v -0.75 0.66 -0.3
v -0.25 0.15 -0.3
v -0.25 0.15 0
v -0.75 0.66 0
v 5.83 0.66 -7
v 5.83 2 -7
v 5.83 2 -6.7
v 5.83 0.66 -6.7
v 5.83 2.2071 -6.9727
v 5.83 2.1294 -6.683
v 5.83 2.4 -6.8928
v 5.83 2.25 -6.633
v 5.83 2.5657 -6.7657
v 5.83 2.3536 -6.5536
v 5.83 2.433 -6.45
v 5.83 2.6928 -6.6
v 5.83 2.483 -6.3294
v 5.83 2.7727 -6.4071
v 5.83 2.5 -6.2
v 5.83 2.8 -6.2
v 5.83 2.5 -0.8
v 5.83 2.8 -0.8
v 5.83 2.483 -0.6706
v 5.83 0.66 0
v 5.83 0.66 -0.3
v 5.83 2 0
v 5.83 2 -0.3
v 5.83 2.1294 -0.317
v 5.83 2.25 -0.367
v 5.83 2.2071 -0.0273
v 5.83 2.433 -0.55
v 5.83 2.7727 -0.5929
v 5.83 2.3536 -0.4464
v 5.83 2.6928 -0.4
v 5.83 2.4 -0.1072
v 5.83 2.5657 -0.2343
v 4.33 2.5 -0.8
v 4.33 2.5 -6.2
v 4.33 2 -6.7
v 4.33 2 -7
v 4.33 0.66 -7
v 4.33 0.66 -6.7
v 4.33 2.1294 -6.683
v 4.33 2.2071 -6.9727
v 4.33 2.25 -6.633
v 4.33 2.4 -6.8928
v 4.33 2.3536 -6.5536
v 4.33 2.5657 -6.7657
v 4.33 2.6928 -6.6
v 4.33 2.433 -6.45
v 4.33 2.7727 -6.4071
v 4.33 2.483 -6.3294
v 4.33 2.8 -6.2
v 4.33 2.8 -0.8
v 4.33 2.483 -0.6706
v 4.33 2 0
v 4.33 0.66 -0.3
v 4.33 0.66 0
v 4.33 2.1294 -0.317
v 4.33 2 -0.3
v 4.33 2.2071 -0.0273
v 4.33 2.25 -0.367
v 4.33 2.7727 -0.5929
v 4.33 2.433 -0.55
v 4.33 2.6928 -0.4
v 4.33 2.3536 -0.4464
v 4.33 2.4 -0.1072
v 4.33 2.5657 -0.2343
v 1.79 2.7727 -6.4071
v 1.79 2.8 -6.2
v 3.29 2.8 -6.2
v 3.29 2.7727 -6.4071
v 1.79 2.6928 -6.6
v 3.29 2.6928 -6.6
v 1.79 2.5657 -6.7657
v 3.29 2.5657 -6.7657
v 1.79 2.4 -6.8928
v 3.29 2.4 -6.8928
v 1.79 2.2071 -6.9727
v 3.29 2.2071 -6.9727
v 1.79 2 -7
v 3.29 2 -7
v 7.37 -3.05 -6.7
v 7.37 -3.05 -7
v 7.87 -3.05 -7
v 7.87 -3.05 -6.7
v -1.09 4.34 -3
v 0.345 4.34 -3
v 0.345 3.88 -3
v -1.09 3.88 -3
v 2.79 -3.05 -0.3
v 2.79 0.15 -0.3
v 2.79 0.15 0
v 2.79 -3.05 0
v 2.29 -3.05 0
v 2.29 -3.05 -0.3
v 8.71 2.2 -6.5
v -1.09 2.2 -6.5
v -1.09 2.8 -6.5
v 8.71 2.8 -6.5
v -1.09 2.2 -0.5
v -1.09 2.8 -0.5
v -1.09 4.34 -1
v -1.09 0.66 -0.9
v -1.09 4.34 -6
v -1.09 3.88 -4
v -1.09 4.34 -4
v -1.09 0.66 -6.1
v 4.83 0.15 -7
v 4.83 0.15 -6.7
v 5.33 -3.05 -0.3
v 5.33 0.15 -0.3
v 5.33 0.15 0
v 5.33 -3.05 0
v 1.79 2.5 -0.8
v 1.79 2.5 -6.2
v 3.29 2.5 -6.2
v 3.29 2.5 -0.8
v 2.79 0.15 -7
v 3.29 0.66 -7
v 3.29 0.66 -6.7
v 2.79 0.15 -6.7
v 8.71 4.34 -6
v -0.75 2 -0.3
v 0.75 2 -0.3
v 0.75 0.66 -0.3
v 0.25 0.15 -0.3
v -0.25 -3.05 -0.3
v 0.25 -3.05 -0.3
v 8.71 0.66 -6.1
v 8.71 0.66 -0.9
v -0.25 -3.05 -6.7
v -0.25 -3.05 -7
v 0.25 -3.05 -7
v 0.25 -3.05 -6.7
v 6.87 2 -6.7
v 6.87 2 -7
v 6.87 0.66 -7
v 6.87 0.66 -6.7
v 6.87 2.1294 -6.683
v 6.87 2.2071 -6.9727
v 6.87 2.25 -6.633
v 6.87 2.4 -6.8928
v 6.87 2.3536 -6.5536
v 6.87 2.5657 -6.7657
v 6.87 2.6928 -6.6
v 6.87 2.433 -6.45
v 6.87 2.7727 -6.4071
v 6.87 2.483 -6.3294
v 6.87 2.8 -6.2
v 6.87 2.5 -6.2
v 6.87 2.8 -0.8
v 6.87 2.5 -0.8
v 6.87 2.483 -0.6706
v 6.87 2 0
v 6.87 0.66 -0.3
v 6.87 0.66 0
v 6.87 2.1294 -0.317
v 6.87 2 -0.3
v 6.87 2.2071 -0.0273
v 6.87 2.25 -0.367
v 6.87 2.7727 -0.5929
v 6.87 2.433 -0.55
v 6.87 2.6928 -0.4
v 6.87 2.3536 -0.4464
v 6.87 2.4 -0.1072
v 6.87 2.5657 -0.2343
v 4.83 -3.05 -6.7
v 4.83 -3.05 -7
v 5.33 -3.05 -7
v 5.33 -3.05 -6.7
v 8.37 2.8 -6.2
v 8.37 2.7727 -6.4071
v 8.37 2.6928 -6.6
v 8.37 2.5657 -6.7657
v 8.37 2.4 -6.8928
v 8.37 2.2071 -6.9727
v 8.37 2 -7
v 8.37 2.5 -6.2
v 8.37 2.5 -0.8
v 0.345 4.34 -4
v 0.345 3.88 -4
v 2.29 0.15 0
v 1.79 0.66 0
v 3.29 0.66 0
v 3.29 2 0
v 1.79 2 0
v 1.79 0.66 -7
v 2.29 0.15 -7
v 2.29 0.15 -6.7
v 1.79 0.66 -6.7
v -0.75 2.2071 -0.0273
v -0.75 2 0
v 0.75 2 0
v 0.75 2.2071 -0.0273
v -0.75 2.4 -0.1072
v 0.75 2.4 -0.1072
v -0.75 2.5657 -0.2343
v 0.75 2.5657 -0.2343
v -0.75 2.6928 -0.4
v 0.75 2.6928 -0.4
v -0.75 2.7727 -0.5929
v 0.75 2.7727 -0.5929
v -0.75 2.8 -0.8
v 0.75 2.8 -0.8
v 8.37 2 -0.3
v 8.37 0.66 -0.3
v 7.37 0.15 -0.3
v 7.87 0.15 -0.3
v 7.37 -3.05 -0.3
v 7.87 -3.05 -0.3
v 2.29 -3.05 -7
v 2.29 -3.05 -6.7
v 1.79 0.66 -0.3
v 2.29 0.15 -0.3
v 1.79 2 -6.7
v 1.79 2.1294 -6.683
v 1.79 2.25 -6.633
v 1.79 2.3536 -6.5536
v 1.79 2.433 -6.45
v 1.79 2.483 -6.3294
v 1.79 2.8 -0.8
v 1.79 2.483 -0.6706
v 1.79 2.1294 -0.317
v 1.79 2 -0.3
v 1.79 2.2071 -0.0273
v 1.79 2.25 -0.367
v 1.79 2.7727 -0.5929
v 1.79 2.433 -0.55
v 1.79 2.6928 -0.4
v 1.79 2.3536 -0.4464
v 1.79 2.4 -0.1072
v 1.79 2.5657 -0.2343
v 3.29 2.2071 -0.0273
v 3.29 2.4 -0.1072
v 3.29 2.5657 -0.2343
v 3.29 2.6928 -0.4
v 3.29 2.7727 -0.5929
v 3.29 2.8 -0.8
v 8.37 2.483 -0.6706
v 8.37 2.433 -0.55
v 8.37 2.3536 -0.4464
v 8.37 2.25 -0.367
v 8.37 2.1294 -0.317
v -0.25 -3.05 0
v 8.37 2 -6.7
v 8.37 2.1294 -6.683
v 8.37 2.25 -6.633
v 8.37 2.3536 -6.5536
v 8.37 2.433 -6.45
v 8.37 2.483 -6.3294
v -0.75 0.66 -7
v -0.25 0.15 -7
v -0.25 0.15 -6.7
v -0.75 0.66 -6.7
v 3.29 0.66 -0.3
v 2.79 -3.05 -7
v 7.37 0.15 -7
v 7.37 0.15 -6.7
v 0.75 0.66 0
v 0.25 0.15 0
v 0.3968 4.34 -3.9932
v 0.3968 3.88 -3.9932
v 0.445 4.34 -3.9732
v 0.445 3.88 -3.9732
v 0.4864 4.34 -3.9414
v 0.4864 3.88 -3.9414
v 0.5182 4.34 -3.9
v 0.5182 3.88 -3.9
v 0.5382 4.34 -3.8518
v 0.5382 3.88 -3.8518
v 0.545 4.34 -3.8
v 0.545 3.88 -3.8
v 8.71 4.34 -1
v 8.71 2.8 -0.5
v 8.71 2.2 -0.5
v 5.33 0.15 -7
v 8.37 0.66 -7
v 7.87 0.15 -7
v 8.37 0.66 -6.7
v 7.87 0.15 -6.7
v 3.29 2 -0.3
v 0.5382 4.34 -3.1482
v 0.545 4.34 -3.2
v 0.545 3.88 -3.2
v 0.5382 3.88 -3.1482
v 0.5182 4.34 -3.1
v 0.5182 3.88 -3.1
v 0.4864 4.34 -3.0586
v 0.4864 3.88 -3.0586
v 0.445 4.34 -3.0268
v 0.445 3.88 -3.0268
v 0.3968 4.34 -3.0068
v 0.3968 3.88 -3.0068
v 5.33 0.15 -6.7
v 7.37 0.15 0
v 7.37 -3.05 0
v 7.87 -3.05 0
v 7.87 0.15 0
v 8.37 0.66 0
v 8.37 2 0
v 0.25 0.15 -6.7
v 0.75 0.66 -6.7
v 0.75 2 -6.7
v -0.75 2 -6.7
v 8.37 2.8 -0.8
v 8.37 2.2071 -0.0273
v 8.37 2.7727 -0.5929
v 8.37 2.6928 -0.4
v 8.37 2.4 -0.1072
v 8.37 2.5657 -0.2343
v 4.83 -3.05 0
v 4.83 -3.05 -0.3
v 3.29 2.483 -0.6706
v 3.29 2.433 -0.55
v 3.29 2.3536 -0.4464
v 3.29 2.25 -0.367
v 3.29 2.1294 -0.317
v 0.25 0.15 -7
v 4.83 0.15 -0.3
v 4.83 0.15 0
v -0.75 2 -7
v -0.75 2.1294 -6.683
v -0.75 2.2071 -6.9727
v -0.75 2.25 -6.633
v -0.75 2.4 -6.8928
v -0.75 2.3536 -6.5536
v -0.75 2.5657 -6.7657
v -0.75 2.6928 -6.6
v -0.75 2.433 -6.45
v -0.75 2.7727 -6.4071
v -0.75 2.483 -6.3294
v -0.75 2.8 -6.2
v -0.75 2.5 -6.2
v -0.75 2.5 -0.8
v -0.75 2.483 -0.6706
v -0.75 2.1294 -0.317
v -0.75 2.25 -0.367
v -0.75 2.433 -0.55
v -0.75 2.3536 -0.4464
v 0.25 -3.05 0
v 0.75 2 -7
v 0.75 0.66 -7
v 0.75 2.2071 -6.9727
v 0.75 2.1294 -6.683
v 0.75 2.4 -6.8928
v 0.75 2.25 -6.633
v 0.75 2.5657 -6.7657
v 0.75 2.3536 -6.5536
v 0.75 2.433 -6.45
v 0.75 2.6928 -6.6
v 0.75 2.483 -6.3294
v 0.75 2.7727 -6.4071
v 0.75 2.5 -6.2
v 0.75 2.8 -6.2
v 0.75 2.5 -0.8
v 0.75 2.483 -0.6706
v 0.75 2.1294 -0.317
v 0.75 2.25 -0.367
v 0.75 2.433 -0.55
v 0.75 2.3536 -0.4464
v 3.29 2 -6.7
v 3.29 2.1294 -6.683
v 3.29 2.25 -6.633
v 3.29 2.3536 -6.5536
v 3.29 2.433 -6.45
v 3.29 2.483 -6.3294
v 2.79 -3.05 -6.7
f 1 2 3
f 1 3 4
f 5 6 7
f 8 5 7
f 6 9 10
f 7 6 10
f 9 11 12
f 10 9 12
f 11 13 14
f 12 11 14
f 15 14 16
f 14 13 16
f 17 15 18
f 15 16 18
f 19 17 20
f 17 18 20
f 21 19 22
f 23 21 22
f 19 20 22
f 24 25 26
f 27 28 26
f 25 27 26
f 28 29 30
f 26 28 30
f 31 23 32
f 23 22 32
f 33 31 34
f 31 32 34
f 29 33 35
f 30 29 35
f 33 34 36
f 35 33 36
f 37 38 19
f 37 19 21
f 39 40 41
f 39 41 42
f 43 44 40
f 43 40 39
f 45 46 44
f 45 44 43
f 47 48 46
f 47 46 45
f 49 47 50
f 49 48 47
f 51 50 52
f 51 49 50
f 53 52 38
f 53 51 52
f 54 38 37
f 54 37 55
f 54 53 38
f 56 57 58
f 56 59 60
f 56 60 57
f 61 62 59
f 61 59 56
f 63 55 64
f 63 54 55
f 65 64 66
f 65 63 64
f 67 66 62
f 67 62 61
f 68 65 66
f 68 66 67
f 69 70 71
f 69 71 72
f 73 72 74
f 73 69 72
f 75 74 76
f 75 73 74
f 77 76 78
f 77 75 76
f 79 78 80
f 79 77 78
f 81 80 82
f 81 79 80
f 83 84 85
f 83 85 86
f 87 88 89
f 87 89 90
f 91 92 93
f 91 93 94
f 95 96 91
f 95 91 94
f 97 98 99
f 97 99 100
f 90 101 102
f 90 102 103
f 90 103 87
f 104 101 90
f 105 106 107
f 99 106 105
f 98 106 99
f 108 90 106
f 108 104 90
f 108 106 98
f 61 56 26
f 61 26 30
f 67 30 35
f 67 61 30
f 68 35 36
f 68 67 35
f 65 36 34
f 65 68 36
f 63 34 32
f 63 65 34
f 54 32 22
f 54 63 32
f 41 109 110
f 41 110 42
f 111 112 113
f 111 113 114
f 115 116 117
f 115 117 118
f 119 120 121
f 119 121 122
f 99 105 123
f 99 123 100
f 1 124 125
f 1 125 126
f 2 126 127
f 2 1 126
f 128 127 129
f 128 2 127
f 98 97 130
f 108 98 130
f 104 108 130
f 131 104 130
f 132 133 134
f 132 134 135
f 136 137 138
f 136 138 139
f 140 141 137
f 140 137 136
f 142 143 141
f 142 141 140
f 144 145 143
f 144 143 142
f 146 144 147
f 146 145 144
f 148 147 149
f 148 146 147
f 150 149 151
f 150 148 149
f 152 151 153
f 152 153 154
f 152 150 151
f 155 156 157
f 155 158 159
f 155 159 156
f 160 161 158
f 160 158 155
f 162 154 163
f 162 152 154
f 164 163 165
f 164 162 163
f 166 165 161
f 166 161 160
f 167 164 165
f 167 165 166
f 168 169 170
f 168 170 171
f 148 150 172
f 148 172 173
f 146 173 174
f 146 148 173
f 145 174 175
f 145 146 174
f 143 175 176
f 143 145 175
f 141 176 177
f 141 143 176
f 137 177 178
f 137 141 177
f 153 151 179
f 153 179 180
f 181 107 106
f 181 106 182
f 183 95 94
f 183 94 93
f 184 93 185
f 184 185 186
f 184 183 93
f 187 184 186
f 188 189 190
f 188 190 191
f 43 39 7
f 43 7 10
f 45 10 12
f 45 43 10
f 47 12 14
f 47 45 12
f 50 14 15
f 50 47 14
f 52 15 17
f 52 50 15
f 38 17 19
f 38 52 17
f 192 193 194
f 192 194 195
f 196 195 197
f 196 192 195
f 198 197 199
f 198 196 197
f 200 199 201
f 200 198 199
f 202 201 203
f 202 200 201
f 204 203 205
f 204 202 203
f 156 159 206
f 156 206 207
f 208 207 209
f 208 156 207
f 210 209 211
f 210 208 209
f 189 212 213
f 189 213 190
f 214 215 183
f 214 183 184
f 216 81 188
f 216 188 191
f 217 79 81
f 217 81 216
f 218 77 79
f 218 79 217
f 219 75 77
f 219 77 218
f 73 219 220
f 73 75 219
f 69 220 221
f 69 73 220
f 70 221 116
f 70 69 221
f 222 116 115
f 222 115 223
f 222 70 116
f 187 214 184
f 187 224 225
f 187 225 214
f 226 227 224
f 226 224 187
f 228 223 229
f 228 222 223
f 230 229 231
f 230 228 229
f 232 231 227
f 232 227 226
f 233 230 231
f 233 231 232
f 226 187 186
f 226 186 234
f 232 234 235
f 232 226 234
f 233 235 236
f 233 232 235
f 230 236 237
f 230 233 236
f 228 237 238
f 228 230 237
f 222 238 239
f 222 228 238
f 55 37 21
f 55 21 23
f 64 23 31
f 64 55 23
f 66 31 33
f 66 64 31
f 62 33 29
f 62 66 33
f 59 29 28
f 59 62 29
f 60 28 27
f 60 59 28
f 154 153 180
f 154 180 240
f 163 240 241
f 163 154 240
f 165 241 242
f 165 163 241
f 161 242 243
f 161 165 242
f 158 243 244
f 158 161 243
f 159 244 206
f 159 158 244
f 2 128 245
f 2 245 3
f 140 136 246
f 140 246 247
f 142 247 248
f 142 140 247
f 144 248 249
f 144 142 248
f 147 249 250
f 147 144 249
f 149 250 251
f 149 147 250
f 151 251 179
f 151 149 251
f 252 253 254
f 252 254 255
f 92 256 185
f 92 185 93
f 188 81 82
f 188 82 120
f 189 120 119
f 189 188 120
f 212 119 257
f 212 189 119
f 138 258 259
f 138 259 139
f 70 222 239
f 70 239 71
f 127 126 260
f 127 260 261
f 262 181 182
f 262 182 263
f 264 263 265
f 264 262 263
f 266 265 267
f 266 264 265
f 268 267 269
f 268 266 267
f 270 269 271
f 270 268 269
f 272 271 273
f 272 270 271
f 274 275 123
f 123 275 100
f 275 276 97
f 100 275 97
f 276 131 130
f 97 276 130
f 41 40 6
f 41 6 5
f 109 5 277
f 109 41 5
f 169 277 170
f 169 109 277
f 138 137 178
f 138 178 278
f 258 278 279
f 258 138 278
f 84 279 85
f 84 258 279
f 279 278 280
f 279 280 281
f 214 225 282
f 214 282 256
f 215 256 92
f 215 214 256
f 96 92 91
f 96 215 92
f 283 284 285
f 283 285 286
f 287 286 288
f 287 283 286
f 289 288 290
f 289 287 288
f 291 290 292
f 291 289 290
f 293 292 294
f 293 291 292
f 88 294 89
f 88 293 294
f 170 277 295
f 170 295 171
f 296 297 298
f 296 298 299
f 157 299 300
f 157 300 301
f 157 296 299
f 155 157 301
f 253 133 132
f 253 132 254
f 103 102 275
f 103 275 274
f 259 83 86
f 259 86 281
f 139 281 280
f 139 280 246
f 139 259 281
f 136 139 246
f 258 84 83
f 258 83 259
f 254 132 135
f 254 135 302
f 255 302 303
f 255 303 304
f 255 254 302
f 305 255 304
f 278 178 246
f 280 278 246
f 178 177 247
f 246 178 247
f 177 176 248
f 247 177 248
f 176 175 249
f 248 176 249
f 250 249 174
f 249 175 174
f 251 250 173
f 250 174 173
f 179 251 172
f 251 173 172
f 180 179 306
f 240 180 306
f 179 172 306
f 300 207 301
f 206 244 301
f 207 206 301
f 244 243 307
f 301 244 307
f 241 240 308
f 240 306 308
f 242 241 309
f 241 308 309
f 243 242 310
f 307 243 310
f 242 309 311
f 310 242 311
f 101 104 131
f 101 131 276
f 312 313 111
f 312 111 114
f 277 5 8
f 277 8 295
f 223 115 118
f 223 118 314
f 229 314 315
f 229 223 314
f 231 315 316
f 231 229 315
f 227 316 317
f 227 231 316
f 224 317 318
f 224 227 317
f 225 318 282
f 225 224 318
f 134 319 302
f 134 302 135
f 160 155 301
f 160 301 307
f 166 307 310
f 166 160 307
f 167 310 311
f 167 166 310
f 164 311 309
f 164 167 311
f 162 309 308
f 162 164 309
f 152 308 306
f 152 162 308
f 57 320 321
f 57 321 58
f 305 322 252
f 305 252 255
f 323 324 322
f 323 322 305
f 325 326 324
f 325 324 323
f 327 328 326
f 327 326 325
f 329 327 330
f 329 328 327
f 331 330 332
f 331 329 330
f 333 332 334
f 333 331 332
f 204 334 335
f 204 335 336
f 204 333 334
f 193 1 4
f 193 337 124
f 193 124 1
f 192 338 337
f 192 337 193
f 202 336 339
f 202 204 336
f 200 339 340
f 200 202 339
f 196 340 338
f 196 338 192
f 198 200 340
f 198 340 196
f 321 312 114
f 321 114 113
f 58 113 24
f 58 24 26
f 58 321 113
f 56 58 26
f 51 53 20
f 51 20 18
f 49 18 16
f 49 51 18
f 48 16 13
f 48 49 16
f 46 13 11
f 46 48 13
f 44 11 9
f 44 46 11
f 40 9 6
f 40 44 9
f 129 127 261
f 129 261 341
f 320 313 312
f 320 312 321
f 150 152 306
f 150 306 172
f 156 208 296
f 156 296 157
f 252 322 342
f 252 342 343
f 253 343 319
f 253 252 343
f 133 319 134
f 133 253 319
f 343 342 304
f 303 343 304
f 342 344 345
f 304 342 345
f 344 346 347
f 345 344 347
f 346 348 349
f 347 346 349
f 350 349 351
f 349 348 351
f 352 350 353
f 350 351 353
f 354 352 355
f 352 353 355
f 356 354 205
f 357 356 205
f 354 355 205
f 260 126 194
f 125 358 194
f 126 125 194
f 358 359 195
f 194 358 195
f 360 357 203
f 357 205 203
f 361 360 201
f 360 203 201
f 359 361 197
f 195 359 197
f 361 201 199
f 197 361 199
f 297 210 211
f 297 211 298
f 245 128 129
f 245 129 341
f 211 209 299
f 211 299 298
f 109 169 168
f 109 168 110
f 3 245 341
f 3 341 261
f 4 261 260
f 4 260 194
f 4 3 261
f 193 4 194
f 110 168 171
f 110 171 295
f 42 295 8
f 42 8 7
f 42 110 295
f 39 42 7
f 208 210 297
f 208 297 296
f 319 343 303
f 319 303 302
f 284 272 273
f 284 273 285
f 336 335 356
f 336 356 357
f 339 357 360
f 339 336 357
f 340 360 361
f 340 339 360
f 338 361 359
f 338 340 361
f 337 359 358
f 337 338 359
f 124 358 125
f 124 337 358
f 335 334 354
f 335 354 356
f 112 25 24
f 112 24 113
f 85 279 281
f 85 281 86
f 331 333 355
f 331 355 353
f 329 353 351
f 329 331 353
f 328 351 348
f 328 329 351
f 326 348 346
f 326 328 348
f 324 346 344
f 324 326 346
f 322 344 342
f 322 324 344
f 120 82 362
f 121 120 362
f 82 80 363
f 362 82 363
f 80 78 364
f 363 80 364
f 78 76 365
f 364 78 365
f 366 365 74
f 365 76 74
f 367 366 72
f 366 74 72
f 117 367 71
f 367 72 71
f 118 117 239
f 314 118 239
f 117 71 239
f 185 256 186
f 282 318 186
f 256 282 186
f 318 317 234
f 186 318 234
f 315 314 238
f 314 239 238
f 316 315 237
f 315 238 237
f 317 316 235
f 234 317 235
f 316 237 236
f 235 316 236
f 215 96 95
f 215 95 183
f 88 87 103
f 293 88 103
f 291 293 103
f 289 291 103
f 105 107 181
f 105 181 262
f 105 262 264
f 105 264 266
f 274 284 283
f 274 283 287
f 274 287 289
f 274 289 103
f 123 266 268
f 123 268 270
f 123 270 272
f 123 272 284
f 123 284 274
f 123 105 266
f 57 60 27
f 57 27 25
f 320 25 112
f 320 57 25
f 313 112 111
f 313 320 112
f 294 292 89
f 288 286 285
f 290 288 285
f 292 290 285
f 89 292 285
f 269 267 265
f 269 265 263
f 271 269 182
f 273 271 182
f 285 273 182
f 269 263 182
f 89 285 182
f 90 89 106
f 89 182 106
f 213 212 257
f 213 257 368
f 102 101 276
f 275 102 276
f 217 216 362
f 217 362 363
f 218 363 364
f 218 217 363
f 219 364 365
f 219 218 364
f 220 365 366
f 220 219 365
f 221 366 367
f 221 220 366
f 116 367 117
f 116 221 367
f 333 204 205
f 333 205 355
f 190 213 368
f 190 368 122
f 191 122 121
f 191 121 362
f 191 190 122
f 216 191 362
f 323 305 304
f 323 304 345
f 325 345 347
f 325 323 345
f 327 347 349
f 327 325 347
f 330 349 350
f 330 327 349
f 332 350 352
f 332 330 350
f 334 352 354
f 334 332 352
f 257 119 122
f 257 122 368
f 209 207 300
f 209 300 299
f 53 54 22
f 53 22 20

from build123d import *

# Parameters (mm, degrees)
BODY_FEATURE_DEPTH                    = 1.84
BODY_FEATURE_DEPTH_BACK               = 1.84
SKETCH1_W                             = 9.8
SKETCH1_H                             = 6
BEVEL_FEATURE_DEPTH                   = 9.8
BEVEL_FEATURE_DEPTH_BACK              = 9.8
SIGN_FEATURE_DEPTH                    = 0.46
FIRST_AND_LAST_PIN_FEATURE_DEPTH      = 0.75
FIRST_AND_LAST_PIN_FEATURE_DEPTH_BACK = 0.75
PIN_PROFILE_FEATURE_DEPTH             = 10
PIN_PROFILE_FEATURE_DEPTH_BACK        = 10
OTHER_PINS_FEATURE_COUNT              = 4
OTHER_PINS_FEATURE_PITCH              = 2.54


# Sheet-metal steps are written as plain solids
with BuildPart() as part:
    # Sketch1 → Body Feature (new, two sides: drawn at the far end of the back side and taken through both)
    with BuildSketch(Plane(origin=(0, 2.5, 0), x_dir=(1, 0, 0), z_dir=(0, 1, 0)).offset(-BODY_FEATURE_DEPTH_BACK)):
        with Locations((3.81, 3.5)):
            Rectangle(SKETCH1_W, SKETCH1_H)
    extrude(amount=BODY_FEATURE_DEPTH + BODY_FEATURE_DEPTH_BACK)

    # Sketch2 → Bevel Feature (cut, two sides: drawn at the far end of the back side and taken through both)
    with BuildSketch(Plane(origin=(0, 0, 0), x_dir=(0, 0, -1), z_dir=(1, 0, 0)).offset(-BEVEL_FEATURE_DEPTH_BACK)):
        Polygon((-9.5, 4.382711437), (-6.267114103, 14.34), (13.267114103, 14.34), (16.5, 4.382711437), (16.5, 0.922493794), (13.834417196, -9.34), (-6.834417196, -9.34), (-9.5, 0.922493794), align=None)
        Polygon((0.5, 2.8), (1, 4.34), (6, 4.34), (6.5, 2.8), (6.5, 2.2), (6.1, 0.66), (0.9, 0.66), (0.5, 2.2), align=None, mode=Mode.SUBTRACT)
    extrude(amount=BEVEL_FEATURE_DEPTH + BEVEL_FEATURE_DEPTH_BACK, mode=Mode.SUBTRACT)

    # Sketch3 → Sign Feature (cut)
    with BuildSketch(Plane(origin=(0, 4.34, 0), x_dir=(1, 0, 0), z_dir=(0, 1, 0))):
        with BuildLine():
            Line((-1.435, 4), (0.345, 4))
            ThreePointArc((0.345, 4), (0.486421356, 3.941421356), (0.545, 3.8))
            Line((0.545, 3.8), (0.545, 3.2))
            ThreePointArc((0.545, 3.2), (0.486421356, 3.058578644), (0.345, 3))
            Line((0.345, 3), (-1.435, 3))
            ThreePointArc((-1.435, 3), (-1.576421356, 3.058578644), (-1.635, 3.2))
            Line((-1.635, 3.2), (-1.635, 3.8))
            ThreePointArc((-1.635, 3.8), (-1.576421356, 3.941421356), (-1.435, 4))
        make_face()
    extrude(amount=-SIGN_FEATURE_DEPTH, mode=Mode.SUBTRACT)


with BuildPart() as body_2:
    # Sketch4 → First and Last Pin Feature (new, two sides: drawn at the far end of the back side and taken through both)
    with BuildSketch(Plane(origin=(0, 0, 0), x_dir=(0, 0, -1), z_dir=(1, 0, 0)).offset(-FIRST_AND_LAST_PIN_FEATURE_DEPTH_BACK)):
        with BuildLine():
            Line((0, -3.05), (0, 2))
            ThreePointArc((0, 2), (0.234314575, 2.565685425), (0.8, 2.8))
            Line((0.8, 2.8), (6.2, 2.8))
            ThreePointArc((6.2, 2.8), (6.765685425, 2.565685425), (7, 2))
            Line((7, 2), (7, -3.05))
            Line((7, -3.05), (6.7, -3.05))
            Line((6.7, -3.05), (6.7, 2))
            ThreePointArc((6.7, 2), (6.553553391, 2.353553391), (6.2, 2.5))
            Line((6.2, 2.5), (0.8, 2.5))
            ThreePointArc((0.8, 2.5), (0.446446609, 2.353553391), (0.3, 2))
            Line((0.3, 2), (0.3, -3.05))
            Line((0.3, -3.05), (0, -3.05))
        make_face()
    extrude(amount=FIRST_AND_LAST_PIN_FEATURE_DEPTH + FIRST_AND_LAST_PIN_FEATURE_DEPTH_BACK)

    # Sketch9 → Pin Profile Feature (cut, two sides: drawn at the far end of the back side and taken through both)
    with BuildSketch(Plane.XY.offset(-PIN_PROFILE_FEATURE_DEPTH_BACK)):
        Polygon((-0.25, -3.05), (-0.25, 0.15), (-0.75, 0.66), (-0.75, -4.05), (0.75, -4.05), (0.75, 0.66), (0.25, 0.15), (0.25, -3.05), align=None)
    extrude(amount=PIN_PROFILE_FEATURE_DEPTH + PIN_PROFILE_FEATURE_DEPTH_BACK, mode=Mode.SUBTRACT)


with BuildPart() as other_pins_feature_1:
    # Other Pins Feature: pattern copy
    add(body_2.part.moved(Location(Vector(1, 0, 0) * (1 * OTHER_PINS_FEATURE_PITCH))))


with BuildPart() as other_pins_feature_2:
    # Other Pins Feature: pattern copy
    add(body_2.part.moved(Location(Vector(1, 0, 0) * (2 * OTHER_PINS_FEATURE_PITCH))))


with BuildPart() as other_pins_feature_3:
    # Other Pins Feature: pattern copy
    add(body_2.part.moved(Location(Vector(1, 0, 0) * (3 * OTHER_PINS_FEATURE_PITCH))))


solid = Compound([part.part, body_2.part, other_pins_feature_1.part, other_pins_feature_2.part, other_pins_feature_3.part])
